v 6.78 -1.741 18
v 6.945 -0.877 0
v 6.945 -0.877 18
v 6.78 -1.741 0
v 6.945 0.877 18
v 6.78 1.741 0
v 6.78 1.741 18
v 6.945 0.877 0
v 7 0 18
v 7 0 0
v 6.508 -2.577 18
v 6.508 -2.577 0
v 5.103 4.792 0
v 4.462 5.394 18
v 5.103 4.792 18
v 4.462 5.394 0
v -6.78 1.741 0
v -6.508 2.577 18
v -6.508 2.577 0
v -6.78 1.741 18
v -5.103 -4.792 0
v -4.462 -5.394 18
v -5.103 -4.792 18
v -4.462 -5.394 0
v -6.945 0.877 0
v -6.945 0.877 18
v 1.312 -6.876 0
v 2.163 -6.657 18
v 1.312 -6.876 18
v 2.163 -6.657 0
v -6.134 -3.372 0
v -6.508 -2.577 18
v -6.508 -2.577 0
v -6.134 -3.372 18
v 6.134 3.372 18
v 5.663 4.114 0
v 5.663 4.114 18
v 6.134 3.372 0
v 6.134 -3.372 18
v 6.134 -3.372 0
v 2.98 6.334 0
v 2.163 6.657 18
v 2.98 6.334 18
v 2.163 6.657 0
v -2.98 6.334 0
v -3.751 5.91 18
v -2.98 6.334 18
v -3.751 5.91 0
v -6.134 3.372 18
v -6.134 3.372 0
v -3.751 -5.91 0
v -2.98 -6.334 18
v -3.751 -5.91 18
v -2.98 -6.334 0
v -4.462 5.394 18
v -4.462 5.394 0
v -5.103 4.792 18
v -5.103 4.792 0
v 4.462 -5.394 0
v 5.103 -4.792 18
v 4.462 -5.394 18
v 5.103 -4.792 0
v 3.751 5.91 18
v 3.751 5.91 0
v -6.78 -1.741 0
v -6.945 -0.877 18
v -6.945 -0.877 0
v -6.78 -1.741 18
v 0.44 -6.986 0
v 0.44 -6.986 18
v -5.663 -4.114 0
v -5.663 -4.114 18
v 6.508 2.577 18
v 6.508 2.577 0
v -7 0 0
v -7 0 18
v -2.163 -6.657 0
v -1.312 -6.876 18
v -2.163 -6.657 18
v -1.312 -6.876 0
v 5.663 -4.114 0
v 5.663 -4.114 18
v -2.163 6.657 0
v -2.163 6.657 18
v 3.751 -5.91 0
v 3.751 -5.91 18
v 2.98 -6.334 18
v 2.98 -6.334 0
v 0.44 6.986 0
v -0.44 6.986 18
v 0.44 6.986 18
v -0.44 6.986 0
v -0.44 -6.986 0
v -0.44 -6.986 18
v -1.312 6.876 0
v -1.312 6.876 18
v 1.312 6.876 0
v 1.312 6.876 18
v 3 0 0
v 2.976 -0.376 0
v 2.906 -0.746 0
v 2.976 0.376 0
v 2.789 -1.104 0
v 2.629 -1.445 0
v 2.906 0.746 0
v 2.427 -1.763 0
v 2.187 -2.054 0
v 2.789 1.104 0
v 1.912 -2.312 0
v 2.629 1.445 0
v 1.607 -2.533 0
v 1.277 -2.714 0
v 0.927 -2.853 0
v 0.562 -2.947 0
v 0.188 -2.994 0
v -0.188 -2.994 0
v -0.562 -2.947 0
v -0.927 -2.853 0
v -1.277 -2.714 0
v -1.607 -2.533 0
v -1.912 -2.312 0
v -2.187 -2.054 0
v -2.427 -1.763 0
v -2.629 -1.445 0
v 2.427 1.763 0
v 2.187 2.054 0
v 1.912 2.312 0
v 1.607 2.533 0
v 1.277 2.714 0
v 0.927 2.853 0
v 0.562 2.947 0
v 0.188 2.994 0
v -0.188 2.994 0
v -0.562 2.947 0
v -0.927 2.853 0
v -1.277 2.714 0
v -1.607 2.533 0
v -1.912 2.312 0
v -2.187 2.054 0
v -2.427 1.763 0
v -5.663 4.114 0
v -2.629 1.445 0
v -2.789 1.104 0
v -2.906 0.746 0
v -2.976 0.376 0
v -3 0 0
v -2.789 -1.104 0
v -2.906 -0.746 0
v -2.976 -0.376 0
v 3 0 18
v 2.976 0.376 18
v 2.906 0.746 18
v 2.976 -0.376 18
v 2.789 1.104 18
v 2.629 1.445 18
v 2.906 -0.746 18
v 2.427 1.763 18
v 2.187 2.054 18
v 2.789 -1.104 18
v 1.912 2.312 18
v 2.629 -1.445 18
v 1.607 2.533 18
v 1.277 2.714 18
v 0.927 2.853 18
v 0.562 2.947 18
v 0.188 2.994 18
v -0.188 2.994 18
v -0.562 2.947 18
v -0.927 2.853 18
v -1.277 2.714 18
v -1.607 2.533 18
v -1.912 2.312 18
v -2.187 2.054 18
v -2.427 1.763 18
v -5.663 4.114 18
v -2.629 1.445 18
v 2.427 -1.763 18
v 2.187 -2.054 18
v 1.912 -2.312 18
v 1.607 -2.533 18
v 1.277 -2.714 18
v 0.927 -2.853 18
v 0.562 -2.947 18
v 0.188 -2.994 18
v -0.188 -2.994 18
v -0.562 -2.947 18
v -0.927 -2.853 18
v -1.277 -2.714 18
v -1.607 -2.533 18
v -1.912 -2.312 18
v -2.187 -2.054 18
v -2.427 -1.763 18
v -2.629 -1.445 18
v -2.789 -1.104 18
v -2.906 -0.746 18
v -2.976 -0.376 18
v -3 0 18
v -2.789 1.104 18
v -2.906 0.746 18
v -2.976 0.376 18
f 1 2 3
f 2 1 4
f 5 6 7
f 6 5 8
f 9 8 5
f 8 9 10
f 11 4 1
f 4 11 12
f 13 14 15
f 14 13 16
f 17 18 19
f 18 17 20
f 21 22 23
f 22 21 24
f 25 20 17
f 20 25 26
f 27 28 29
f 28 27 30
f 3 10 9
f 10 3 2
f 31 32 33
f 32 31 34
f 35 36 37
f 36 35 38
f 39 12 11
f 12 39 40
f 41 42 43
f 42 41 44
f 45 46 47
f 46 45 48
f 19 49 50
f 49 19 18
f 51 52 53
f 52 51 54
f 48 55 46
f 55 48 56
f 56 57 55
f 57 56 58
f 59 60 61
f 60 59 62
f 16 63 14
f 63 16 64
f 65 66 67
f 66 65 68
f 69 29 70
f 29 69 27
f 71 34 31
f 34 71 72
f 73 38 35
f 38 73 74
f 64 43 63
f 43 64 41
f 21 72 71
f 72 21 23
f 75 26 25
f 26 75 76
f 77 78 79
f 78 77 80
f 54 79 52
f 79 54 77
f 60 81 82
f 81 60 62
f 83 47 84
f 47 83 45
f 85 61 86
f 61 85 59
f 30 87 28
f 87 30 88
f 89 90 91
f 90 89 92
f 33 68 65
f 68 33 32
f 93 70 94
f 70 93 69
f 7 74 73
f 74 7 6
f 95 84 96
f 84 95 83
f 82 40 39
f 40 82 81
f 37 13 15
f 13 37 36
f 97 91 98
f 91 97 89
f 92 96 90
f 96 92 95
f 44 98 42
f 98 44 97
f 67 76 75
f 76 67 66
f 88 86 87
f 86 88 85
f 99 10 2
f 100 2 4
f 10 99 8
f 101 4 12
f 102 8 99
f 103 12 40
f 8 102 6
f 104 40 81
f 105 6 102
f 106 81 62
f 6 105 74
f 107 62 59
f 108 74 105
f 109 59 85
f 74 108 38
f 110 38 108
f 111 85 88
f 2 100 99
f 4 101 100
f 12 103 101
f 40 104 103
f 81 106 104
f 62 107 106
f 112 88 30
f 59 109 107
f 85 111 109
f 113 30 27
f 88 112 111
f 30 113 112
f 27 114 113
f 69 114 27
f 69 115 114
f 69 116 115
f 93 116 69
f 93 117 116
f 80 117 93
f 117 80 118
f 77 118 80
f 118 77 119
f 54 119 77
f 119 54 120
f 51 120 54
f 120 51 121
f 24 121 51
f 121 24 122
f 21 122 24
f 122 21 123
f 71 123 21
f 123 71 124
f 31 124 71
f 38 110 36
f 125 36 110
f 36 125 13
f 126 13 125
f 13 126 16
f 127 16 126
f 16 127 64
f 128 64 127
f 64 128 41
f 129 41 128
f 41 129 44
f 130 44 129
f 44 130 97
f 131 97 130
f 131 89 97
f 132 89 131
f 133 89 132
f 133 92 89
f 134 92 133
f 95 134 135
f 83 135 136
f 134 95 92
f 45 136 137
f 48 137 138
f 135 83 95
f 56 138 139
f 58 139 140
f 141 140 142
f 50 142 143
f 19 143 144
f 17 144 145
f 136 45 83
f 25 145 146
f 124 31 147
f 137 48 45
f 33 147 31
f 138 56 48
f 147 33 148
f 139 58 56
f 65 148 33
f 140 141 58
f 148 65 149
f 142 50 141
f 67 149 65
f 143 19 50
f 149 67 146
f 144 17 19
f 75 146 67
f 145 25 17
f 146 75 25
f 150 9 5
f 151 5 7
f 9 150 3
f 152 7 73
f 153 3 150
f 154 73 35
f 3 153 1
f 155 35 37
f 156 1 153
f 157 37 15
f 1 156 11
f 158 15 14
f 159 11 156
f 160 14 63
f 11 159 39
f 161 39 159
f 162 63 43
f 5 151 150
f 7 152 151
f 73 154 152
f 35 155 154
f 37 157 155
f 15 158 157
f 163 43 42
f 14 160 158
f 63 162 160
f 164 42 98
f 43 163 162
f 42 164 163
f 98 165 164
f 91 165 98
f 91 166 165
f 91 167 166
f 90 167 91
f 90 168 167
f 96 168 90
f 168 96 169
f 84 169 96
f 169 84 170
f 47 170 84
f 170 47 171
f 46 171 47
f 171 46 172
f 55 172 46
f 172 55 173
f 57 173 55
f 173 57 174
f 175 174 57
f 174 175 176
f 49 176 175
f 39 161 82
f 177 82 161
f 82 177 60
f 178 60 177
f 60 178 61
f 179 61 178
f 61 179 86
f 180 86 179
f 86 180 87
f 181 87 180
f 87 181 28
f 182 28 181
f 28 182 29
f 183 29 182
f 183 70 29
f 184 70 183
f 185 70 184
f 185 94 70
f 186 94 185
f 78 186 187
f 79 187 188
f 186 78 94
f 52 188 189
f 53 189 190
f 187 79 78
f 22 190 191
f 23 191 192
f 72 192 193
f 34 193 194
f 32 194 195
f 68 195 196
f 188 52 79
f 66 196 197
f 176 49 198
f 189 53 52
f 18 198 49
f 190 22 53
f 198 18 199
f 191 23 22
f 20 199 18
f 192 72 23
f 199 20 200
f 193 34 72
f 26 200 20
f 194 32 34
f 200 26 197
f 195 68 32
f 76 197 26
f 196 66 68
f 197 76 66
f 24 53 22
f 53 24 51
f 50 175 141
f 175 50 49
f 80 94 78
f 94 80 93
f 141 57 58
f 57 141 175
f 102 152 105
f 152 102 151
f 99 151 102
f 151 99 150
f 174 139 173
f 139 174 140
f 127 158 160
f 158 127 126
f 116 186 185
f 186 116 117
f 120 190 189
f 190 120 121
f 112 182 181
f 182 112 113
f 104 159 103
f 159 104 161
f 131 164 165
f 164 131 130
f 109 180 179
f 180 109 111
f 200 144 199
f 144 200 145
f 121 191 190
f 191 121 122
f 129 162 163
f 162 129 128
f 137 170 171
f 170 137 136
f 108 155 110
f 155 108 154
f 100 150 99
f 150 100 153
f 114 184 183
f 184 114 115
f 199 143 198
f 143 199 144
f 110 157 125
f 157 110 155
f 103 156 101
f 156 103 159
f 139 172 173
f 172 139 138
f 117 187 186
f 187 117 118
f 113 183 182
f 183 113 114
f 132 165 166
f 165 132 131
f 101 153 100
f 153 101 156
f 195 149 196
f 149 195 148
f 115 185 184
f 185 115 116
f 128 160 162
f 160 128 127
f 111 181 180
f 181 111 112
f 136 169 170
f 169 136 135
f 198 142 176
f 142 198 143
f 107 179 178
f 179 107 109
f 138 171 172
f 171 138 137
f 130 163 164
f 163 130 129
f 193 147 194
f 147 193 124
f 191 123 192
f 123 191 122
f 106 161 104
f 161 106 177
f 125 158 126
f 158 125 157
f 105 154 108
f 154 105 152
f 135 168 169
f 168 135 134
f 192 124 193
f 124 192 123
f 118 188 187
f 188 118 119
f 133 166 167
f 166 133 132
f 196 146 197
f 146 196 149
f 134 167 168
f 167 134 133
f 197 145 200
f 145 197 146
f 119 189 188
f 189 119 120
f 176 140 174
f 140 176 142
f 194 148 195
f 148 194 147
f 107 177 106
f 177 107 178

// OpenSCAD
$fn = 50;


difference() {
	union() {
		cylinder(h = 18, r = 7.0000000000);
	}
	union() {
		translate(v = [0, 0, -100]) {
			cylinder(h = 200, r = 3.0000000000);
		}
	}
}
